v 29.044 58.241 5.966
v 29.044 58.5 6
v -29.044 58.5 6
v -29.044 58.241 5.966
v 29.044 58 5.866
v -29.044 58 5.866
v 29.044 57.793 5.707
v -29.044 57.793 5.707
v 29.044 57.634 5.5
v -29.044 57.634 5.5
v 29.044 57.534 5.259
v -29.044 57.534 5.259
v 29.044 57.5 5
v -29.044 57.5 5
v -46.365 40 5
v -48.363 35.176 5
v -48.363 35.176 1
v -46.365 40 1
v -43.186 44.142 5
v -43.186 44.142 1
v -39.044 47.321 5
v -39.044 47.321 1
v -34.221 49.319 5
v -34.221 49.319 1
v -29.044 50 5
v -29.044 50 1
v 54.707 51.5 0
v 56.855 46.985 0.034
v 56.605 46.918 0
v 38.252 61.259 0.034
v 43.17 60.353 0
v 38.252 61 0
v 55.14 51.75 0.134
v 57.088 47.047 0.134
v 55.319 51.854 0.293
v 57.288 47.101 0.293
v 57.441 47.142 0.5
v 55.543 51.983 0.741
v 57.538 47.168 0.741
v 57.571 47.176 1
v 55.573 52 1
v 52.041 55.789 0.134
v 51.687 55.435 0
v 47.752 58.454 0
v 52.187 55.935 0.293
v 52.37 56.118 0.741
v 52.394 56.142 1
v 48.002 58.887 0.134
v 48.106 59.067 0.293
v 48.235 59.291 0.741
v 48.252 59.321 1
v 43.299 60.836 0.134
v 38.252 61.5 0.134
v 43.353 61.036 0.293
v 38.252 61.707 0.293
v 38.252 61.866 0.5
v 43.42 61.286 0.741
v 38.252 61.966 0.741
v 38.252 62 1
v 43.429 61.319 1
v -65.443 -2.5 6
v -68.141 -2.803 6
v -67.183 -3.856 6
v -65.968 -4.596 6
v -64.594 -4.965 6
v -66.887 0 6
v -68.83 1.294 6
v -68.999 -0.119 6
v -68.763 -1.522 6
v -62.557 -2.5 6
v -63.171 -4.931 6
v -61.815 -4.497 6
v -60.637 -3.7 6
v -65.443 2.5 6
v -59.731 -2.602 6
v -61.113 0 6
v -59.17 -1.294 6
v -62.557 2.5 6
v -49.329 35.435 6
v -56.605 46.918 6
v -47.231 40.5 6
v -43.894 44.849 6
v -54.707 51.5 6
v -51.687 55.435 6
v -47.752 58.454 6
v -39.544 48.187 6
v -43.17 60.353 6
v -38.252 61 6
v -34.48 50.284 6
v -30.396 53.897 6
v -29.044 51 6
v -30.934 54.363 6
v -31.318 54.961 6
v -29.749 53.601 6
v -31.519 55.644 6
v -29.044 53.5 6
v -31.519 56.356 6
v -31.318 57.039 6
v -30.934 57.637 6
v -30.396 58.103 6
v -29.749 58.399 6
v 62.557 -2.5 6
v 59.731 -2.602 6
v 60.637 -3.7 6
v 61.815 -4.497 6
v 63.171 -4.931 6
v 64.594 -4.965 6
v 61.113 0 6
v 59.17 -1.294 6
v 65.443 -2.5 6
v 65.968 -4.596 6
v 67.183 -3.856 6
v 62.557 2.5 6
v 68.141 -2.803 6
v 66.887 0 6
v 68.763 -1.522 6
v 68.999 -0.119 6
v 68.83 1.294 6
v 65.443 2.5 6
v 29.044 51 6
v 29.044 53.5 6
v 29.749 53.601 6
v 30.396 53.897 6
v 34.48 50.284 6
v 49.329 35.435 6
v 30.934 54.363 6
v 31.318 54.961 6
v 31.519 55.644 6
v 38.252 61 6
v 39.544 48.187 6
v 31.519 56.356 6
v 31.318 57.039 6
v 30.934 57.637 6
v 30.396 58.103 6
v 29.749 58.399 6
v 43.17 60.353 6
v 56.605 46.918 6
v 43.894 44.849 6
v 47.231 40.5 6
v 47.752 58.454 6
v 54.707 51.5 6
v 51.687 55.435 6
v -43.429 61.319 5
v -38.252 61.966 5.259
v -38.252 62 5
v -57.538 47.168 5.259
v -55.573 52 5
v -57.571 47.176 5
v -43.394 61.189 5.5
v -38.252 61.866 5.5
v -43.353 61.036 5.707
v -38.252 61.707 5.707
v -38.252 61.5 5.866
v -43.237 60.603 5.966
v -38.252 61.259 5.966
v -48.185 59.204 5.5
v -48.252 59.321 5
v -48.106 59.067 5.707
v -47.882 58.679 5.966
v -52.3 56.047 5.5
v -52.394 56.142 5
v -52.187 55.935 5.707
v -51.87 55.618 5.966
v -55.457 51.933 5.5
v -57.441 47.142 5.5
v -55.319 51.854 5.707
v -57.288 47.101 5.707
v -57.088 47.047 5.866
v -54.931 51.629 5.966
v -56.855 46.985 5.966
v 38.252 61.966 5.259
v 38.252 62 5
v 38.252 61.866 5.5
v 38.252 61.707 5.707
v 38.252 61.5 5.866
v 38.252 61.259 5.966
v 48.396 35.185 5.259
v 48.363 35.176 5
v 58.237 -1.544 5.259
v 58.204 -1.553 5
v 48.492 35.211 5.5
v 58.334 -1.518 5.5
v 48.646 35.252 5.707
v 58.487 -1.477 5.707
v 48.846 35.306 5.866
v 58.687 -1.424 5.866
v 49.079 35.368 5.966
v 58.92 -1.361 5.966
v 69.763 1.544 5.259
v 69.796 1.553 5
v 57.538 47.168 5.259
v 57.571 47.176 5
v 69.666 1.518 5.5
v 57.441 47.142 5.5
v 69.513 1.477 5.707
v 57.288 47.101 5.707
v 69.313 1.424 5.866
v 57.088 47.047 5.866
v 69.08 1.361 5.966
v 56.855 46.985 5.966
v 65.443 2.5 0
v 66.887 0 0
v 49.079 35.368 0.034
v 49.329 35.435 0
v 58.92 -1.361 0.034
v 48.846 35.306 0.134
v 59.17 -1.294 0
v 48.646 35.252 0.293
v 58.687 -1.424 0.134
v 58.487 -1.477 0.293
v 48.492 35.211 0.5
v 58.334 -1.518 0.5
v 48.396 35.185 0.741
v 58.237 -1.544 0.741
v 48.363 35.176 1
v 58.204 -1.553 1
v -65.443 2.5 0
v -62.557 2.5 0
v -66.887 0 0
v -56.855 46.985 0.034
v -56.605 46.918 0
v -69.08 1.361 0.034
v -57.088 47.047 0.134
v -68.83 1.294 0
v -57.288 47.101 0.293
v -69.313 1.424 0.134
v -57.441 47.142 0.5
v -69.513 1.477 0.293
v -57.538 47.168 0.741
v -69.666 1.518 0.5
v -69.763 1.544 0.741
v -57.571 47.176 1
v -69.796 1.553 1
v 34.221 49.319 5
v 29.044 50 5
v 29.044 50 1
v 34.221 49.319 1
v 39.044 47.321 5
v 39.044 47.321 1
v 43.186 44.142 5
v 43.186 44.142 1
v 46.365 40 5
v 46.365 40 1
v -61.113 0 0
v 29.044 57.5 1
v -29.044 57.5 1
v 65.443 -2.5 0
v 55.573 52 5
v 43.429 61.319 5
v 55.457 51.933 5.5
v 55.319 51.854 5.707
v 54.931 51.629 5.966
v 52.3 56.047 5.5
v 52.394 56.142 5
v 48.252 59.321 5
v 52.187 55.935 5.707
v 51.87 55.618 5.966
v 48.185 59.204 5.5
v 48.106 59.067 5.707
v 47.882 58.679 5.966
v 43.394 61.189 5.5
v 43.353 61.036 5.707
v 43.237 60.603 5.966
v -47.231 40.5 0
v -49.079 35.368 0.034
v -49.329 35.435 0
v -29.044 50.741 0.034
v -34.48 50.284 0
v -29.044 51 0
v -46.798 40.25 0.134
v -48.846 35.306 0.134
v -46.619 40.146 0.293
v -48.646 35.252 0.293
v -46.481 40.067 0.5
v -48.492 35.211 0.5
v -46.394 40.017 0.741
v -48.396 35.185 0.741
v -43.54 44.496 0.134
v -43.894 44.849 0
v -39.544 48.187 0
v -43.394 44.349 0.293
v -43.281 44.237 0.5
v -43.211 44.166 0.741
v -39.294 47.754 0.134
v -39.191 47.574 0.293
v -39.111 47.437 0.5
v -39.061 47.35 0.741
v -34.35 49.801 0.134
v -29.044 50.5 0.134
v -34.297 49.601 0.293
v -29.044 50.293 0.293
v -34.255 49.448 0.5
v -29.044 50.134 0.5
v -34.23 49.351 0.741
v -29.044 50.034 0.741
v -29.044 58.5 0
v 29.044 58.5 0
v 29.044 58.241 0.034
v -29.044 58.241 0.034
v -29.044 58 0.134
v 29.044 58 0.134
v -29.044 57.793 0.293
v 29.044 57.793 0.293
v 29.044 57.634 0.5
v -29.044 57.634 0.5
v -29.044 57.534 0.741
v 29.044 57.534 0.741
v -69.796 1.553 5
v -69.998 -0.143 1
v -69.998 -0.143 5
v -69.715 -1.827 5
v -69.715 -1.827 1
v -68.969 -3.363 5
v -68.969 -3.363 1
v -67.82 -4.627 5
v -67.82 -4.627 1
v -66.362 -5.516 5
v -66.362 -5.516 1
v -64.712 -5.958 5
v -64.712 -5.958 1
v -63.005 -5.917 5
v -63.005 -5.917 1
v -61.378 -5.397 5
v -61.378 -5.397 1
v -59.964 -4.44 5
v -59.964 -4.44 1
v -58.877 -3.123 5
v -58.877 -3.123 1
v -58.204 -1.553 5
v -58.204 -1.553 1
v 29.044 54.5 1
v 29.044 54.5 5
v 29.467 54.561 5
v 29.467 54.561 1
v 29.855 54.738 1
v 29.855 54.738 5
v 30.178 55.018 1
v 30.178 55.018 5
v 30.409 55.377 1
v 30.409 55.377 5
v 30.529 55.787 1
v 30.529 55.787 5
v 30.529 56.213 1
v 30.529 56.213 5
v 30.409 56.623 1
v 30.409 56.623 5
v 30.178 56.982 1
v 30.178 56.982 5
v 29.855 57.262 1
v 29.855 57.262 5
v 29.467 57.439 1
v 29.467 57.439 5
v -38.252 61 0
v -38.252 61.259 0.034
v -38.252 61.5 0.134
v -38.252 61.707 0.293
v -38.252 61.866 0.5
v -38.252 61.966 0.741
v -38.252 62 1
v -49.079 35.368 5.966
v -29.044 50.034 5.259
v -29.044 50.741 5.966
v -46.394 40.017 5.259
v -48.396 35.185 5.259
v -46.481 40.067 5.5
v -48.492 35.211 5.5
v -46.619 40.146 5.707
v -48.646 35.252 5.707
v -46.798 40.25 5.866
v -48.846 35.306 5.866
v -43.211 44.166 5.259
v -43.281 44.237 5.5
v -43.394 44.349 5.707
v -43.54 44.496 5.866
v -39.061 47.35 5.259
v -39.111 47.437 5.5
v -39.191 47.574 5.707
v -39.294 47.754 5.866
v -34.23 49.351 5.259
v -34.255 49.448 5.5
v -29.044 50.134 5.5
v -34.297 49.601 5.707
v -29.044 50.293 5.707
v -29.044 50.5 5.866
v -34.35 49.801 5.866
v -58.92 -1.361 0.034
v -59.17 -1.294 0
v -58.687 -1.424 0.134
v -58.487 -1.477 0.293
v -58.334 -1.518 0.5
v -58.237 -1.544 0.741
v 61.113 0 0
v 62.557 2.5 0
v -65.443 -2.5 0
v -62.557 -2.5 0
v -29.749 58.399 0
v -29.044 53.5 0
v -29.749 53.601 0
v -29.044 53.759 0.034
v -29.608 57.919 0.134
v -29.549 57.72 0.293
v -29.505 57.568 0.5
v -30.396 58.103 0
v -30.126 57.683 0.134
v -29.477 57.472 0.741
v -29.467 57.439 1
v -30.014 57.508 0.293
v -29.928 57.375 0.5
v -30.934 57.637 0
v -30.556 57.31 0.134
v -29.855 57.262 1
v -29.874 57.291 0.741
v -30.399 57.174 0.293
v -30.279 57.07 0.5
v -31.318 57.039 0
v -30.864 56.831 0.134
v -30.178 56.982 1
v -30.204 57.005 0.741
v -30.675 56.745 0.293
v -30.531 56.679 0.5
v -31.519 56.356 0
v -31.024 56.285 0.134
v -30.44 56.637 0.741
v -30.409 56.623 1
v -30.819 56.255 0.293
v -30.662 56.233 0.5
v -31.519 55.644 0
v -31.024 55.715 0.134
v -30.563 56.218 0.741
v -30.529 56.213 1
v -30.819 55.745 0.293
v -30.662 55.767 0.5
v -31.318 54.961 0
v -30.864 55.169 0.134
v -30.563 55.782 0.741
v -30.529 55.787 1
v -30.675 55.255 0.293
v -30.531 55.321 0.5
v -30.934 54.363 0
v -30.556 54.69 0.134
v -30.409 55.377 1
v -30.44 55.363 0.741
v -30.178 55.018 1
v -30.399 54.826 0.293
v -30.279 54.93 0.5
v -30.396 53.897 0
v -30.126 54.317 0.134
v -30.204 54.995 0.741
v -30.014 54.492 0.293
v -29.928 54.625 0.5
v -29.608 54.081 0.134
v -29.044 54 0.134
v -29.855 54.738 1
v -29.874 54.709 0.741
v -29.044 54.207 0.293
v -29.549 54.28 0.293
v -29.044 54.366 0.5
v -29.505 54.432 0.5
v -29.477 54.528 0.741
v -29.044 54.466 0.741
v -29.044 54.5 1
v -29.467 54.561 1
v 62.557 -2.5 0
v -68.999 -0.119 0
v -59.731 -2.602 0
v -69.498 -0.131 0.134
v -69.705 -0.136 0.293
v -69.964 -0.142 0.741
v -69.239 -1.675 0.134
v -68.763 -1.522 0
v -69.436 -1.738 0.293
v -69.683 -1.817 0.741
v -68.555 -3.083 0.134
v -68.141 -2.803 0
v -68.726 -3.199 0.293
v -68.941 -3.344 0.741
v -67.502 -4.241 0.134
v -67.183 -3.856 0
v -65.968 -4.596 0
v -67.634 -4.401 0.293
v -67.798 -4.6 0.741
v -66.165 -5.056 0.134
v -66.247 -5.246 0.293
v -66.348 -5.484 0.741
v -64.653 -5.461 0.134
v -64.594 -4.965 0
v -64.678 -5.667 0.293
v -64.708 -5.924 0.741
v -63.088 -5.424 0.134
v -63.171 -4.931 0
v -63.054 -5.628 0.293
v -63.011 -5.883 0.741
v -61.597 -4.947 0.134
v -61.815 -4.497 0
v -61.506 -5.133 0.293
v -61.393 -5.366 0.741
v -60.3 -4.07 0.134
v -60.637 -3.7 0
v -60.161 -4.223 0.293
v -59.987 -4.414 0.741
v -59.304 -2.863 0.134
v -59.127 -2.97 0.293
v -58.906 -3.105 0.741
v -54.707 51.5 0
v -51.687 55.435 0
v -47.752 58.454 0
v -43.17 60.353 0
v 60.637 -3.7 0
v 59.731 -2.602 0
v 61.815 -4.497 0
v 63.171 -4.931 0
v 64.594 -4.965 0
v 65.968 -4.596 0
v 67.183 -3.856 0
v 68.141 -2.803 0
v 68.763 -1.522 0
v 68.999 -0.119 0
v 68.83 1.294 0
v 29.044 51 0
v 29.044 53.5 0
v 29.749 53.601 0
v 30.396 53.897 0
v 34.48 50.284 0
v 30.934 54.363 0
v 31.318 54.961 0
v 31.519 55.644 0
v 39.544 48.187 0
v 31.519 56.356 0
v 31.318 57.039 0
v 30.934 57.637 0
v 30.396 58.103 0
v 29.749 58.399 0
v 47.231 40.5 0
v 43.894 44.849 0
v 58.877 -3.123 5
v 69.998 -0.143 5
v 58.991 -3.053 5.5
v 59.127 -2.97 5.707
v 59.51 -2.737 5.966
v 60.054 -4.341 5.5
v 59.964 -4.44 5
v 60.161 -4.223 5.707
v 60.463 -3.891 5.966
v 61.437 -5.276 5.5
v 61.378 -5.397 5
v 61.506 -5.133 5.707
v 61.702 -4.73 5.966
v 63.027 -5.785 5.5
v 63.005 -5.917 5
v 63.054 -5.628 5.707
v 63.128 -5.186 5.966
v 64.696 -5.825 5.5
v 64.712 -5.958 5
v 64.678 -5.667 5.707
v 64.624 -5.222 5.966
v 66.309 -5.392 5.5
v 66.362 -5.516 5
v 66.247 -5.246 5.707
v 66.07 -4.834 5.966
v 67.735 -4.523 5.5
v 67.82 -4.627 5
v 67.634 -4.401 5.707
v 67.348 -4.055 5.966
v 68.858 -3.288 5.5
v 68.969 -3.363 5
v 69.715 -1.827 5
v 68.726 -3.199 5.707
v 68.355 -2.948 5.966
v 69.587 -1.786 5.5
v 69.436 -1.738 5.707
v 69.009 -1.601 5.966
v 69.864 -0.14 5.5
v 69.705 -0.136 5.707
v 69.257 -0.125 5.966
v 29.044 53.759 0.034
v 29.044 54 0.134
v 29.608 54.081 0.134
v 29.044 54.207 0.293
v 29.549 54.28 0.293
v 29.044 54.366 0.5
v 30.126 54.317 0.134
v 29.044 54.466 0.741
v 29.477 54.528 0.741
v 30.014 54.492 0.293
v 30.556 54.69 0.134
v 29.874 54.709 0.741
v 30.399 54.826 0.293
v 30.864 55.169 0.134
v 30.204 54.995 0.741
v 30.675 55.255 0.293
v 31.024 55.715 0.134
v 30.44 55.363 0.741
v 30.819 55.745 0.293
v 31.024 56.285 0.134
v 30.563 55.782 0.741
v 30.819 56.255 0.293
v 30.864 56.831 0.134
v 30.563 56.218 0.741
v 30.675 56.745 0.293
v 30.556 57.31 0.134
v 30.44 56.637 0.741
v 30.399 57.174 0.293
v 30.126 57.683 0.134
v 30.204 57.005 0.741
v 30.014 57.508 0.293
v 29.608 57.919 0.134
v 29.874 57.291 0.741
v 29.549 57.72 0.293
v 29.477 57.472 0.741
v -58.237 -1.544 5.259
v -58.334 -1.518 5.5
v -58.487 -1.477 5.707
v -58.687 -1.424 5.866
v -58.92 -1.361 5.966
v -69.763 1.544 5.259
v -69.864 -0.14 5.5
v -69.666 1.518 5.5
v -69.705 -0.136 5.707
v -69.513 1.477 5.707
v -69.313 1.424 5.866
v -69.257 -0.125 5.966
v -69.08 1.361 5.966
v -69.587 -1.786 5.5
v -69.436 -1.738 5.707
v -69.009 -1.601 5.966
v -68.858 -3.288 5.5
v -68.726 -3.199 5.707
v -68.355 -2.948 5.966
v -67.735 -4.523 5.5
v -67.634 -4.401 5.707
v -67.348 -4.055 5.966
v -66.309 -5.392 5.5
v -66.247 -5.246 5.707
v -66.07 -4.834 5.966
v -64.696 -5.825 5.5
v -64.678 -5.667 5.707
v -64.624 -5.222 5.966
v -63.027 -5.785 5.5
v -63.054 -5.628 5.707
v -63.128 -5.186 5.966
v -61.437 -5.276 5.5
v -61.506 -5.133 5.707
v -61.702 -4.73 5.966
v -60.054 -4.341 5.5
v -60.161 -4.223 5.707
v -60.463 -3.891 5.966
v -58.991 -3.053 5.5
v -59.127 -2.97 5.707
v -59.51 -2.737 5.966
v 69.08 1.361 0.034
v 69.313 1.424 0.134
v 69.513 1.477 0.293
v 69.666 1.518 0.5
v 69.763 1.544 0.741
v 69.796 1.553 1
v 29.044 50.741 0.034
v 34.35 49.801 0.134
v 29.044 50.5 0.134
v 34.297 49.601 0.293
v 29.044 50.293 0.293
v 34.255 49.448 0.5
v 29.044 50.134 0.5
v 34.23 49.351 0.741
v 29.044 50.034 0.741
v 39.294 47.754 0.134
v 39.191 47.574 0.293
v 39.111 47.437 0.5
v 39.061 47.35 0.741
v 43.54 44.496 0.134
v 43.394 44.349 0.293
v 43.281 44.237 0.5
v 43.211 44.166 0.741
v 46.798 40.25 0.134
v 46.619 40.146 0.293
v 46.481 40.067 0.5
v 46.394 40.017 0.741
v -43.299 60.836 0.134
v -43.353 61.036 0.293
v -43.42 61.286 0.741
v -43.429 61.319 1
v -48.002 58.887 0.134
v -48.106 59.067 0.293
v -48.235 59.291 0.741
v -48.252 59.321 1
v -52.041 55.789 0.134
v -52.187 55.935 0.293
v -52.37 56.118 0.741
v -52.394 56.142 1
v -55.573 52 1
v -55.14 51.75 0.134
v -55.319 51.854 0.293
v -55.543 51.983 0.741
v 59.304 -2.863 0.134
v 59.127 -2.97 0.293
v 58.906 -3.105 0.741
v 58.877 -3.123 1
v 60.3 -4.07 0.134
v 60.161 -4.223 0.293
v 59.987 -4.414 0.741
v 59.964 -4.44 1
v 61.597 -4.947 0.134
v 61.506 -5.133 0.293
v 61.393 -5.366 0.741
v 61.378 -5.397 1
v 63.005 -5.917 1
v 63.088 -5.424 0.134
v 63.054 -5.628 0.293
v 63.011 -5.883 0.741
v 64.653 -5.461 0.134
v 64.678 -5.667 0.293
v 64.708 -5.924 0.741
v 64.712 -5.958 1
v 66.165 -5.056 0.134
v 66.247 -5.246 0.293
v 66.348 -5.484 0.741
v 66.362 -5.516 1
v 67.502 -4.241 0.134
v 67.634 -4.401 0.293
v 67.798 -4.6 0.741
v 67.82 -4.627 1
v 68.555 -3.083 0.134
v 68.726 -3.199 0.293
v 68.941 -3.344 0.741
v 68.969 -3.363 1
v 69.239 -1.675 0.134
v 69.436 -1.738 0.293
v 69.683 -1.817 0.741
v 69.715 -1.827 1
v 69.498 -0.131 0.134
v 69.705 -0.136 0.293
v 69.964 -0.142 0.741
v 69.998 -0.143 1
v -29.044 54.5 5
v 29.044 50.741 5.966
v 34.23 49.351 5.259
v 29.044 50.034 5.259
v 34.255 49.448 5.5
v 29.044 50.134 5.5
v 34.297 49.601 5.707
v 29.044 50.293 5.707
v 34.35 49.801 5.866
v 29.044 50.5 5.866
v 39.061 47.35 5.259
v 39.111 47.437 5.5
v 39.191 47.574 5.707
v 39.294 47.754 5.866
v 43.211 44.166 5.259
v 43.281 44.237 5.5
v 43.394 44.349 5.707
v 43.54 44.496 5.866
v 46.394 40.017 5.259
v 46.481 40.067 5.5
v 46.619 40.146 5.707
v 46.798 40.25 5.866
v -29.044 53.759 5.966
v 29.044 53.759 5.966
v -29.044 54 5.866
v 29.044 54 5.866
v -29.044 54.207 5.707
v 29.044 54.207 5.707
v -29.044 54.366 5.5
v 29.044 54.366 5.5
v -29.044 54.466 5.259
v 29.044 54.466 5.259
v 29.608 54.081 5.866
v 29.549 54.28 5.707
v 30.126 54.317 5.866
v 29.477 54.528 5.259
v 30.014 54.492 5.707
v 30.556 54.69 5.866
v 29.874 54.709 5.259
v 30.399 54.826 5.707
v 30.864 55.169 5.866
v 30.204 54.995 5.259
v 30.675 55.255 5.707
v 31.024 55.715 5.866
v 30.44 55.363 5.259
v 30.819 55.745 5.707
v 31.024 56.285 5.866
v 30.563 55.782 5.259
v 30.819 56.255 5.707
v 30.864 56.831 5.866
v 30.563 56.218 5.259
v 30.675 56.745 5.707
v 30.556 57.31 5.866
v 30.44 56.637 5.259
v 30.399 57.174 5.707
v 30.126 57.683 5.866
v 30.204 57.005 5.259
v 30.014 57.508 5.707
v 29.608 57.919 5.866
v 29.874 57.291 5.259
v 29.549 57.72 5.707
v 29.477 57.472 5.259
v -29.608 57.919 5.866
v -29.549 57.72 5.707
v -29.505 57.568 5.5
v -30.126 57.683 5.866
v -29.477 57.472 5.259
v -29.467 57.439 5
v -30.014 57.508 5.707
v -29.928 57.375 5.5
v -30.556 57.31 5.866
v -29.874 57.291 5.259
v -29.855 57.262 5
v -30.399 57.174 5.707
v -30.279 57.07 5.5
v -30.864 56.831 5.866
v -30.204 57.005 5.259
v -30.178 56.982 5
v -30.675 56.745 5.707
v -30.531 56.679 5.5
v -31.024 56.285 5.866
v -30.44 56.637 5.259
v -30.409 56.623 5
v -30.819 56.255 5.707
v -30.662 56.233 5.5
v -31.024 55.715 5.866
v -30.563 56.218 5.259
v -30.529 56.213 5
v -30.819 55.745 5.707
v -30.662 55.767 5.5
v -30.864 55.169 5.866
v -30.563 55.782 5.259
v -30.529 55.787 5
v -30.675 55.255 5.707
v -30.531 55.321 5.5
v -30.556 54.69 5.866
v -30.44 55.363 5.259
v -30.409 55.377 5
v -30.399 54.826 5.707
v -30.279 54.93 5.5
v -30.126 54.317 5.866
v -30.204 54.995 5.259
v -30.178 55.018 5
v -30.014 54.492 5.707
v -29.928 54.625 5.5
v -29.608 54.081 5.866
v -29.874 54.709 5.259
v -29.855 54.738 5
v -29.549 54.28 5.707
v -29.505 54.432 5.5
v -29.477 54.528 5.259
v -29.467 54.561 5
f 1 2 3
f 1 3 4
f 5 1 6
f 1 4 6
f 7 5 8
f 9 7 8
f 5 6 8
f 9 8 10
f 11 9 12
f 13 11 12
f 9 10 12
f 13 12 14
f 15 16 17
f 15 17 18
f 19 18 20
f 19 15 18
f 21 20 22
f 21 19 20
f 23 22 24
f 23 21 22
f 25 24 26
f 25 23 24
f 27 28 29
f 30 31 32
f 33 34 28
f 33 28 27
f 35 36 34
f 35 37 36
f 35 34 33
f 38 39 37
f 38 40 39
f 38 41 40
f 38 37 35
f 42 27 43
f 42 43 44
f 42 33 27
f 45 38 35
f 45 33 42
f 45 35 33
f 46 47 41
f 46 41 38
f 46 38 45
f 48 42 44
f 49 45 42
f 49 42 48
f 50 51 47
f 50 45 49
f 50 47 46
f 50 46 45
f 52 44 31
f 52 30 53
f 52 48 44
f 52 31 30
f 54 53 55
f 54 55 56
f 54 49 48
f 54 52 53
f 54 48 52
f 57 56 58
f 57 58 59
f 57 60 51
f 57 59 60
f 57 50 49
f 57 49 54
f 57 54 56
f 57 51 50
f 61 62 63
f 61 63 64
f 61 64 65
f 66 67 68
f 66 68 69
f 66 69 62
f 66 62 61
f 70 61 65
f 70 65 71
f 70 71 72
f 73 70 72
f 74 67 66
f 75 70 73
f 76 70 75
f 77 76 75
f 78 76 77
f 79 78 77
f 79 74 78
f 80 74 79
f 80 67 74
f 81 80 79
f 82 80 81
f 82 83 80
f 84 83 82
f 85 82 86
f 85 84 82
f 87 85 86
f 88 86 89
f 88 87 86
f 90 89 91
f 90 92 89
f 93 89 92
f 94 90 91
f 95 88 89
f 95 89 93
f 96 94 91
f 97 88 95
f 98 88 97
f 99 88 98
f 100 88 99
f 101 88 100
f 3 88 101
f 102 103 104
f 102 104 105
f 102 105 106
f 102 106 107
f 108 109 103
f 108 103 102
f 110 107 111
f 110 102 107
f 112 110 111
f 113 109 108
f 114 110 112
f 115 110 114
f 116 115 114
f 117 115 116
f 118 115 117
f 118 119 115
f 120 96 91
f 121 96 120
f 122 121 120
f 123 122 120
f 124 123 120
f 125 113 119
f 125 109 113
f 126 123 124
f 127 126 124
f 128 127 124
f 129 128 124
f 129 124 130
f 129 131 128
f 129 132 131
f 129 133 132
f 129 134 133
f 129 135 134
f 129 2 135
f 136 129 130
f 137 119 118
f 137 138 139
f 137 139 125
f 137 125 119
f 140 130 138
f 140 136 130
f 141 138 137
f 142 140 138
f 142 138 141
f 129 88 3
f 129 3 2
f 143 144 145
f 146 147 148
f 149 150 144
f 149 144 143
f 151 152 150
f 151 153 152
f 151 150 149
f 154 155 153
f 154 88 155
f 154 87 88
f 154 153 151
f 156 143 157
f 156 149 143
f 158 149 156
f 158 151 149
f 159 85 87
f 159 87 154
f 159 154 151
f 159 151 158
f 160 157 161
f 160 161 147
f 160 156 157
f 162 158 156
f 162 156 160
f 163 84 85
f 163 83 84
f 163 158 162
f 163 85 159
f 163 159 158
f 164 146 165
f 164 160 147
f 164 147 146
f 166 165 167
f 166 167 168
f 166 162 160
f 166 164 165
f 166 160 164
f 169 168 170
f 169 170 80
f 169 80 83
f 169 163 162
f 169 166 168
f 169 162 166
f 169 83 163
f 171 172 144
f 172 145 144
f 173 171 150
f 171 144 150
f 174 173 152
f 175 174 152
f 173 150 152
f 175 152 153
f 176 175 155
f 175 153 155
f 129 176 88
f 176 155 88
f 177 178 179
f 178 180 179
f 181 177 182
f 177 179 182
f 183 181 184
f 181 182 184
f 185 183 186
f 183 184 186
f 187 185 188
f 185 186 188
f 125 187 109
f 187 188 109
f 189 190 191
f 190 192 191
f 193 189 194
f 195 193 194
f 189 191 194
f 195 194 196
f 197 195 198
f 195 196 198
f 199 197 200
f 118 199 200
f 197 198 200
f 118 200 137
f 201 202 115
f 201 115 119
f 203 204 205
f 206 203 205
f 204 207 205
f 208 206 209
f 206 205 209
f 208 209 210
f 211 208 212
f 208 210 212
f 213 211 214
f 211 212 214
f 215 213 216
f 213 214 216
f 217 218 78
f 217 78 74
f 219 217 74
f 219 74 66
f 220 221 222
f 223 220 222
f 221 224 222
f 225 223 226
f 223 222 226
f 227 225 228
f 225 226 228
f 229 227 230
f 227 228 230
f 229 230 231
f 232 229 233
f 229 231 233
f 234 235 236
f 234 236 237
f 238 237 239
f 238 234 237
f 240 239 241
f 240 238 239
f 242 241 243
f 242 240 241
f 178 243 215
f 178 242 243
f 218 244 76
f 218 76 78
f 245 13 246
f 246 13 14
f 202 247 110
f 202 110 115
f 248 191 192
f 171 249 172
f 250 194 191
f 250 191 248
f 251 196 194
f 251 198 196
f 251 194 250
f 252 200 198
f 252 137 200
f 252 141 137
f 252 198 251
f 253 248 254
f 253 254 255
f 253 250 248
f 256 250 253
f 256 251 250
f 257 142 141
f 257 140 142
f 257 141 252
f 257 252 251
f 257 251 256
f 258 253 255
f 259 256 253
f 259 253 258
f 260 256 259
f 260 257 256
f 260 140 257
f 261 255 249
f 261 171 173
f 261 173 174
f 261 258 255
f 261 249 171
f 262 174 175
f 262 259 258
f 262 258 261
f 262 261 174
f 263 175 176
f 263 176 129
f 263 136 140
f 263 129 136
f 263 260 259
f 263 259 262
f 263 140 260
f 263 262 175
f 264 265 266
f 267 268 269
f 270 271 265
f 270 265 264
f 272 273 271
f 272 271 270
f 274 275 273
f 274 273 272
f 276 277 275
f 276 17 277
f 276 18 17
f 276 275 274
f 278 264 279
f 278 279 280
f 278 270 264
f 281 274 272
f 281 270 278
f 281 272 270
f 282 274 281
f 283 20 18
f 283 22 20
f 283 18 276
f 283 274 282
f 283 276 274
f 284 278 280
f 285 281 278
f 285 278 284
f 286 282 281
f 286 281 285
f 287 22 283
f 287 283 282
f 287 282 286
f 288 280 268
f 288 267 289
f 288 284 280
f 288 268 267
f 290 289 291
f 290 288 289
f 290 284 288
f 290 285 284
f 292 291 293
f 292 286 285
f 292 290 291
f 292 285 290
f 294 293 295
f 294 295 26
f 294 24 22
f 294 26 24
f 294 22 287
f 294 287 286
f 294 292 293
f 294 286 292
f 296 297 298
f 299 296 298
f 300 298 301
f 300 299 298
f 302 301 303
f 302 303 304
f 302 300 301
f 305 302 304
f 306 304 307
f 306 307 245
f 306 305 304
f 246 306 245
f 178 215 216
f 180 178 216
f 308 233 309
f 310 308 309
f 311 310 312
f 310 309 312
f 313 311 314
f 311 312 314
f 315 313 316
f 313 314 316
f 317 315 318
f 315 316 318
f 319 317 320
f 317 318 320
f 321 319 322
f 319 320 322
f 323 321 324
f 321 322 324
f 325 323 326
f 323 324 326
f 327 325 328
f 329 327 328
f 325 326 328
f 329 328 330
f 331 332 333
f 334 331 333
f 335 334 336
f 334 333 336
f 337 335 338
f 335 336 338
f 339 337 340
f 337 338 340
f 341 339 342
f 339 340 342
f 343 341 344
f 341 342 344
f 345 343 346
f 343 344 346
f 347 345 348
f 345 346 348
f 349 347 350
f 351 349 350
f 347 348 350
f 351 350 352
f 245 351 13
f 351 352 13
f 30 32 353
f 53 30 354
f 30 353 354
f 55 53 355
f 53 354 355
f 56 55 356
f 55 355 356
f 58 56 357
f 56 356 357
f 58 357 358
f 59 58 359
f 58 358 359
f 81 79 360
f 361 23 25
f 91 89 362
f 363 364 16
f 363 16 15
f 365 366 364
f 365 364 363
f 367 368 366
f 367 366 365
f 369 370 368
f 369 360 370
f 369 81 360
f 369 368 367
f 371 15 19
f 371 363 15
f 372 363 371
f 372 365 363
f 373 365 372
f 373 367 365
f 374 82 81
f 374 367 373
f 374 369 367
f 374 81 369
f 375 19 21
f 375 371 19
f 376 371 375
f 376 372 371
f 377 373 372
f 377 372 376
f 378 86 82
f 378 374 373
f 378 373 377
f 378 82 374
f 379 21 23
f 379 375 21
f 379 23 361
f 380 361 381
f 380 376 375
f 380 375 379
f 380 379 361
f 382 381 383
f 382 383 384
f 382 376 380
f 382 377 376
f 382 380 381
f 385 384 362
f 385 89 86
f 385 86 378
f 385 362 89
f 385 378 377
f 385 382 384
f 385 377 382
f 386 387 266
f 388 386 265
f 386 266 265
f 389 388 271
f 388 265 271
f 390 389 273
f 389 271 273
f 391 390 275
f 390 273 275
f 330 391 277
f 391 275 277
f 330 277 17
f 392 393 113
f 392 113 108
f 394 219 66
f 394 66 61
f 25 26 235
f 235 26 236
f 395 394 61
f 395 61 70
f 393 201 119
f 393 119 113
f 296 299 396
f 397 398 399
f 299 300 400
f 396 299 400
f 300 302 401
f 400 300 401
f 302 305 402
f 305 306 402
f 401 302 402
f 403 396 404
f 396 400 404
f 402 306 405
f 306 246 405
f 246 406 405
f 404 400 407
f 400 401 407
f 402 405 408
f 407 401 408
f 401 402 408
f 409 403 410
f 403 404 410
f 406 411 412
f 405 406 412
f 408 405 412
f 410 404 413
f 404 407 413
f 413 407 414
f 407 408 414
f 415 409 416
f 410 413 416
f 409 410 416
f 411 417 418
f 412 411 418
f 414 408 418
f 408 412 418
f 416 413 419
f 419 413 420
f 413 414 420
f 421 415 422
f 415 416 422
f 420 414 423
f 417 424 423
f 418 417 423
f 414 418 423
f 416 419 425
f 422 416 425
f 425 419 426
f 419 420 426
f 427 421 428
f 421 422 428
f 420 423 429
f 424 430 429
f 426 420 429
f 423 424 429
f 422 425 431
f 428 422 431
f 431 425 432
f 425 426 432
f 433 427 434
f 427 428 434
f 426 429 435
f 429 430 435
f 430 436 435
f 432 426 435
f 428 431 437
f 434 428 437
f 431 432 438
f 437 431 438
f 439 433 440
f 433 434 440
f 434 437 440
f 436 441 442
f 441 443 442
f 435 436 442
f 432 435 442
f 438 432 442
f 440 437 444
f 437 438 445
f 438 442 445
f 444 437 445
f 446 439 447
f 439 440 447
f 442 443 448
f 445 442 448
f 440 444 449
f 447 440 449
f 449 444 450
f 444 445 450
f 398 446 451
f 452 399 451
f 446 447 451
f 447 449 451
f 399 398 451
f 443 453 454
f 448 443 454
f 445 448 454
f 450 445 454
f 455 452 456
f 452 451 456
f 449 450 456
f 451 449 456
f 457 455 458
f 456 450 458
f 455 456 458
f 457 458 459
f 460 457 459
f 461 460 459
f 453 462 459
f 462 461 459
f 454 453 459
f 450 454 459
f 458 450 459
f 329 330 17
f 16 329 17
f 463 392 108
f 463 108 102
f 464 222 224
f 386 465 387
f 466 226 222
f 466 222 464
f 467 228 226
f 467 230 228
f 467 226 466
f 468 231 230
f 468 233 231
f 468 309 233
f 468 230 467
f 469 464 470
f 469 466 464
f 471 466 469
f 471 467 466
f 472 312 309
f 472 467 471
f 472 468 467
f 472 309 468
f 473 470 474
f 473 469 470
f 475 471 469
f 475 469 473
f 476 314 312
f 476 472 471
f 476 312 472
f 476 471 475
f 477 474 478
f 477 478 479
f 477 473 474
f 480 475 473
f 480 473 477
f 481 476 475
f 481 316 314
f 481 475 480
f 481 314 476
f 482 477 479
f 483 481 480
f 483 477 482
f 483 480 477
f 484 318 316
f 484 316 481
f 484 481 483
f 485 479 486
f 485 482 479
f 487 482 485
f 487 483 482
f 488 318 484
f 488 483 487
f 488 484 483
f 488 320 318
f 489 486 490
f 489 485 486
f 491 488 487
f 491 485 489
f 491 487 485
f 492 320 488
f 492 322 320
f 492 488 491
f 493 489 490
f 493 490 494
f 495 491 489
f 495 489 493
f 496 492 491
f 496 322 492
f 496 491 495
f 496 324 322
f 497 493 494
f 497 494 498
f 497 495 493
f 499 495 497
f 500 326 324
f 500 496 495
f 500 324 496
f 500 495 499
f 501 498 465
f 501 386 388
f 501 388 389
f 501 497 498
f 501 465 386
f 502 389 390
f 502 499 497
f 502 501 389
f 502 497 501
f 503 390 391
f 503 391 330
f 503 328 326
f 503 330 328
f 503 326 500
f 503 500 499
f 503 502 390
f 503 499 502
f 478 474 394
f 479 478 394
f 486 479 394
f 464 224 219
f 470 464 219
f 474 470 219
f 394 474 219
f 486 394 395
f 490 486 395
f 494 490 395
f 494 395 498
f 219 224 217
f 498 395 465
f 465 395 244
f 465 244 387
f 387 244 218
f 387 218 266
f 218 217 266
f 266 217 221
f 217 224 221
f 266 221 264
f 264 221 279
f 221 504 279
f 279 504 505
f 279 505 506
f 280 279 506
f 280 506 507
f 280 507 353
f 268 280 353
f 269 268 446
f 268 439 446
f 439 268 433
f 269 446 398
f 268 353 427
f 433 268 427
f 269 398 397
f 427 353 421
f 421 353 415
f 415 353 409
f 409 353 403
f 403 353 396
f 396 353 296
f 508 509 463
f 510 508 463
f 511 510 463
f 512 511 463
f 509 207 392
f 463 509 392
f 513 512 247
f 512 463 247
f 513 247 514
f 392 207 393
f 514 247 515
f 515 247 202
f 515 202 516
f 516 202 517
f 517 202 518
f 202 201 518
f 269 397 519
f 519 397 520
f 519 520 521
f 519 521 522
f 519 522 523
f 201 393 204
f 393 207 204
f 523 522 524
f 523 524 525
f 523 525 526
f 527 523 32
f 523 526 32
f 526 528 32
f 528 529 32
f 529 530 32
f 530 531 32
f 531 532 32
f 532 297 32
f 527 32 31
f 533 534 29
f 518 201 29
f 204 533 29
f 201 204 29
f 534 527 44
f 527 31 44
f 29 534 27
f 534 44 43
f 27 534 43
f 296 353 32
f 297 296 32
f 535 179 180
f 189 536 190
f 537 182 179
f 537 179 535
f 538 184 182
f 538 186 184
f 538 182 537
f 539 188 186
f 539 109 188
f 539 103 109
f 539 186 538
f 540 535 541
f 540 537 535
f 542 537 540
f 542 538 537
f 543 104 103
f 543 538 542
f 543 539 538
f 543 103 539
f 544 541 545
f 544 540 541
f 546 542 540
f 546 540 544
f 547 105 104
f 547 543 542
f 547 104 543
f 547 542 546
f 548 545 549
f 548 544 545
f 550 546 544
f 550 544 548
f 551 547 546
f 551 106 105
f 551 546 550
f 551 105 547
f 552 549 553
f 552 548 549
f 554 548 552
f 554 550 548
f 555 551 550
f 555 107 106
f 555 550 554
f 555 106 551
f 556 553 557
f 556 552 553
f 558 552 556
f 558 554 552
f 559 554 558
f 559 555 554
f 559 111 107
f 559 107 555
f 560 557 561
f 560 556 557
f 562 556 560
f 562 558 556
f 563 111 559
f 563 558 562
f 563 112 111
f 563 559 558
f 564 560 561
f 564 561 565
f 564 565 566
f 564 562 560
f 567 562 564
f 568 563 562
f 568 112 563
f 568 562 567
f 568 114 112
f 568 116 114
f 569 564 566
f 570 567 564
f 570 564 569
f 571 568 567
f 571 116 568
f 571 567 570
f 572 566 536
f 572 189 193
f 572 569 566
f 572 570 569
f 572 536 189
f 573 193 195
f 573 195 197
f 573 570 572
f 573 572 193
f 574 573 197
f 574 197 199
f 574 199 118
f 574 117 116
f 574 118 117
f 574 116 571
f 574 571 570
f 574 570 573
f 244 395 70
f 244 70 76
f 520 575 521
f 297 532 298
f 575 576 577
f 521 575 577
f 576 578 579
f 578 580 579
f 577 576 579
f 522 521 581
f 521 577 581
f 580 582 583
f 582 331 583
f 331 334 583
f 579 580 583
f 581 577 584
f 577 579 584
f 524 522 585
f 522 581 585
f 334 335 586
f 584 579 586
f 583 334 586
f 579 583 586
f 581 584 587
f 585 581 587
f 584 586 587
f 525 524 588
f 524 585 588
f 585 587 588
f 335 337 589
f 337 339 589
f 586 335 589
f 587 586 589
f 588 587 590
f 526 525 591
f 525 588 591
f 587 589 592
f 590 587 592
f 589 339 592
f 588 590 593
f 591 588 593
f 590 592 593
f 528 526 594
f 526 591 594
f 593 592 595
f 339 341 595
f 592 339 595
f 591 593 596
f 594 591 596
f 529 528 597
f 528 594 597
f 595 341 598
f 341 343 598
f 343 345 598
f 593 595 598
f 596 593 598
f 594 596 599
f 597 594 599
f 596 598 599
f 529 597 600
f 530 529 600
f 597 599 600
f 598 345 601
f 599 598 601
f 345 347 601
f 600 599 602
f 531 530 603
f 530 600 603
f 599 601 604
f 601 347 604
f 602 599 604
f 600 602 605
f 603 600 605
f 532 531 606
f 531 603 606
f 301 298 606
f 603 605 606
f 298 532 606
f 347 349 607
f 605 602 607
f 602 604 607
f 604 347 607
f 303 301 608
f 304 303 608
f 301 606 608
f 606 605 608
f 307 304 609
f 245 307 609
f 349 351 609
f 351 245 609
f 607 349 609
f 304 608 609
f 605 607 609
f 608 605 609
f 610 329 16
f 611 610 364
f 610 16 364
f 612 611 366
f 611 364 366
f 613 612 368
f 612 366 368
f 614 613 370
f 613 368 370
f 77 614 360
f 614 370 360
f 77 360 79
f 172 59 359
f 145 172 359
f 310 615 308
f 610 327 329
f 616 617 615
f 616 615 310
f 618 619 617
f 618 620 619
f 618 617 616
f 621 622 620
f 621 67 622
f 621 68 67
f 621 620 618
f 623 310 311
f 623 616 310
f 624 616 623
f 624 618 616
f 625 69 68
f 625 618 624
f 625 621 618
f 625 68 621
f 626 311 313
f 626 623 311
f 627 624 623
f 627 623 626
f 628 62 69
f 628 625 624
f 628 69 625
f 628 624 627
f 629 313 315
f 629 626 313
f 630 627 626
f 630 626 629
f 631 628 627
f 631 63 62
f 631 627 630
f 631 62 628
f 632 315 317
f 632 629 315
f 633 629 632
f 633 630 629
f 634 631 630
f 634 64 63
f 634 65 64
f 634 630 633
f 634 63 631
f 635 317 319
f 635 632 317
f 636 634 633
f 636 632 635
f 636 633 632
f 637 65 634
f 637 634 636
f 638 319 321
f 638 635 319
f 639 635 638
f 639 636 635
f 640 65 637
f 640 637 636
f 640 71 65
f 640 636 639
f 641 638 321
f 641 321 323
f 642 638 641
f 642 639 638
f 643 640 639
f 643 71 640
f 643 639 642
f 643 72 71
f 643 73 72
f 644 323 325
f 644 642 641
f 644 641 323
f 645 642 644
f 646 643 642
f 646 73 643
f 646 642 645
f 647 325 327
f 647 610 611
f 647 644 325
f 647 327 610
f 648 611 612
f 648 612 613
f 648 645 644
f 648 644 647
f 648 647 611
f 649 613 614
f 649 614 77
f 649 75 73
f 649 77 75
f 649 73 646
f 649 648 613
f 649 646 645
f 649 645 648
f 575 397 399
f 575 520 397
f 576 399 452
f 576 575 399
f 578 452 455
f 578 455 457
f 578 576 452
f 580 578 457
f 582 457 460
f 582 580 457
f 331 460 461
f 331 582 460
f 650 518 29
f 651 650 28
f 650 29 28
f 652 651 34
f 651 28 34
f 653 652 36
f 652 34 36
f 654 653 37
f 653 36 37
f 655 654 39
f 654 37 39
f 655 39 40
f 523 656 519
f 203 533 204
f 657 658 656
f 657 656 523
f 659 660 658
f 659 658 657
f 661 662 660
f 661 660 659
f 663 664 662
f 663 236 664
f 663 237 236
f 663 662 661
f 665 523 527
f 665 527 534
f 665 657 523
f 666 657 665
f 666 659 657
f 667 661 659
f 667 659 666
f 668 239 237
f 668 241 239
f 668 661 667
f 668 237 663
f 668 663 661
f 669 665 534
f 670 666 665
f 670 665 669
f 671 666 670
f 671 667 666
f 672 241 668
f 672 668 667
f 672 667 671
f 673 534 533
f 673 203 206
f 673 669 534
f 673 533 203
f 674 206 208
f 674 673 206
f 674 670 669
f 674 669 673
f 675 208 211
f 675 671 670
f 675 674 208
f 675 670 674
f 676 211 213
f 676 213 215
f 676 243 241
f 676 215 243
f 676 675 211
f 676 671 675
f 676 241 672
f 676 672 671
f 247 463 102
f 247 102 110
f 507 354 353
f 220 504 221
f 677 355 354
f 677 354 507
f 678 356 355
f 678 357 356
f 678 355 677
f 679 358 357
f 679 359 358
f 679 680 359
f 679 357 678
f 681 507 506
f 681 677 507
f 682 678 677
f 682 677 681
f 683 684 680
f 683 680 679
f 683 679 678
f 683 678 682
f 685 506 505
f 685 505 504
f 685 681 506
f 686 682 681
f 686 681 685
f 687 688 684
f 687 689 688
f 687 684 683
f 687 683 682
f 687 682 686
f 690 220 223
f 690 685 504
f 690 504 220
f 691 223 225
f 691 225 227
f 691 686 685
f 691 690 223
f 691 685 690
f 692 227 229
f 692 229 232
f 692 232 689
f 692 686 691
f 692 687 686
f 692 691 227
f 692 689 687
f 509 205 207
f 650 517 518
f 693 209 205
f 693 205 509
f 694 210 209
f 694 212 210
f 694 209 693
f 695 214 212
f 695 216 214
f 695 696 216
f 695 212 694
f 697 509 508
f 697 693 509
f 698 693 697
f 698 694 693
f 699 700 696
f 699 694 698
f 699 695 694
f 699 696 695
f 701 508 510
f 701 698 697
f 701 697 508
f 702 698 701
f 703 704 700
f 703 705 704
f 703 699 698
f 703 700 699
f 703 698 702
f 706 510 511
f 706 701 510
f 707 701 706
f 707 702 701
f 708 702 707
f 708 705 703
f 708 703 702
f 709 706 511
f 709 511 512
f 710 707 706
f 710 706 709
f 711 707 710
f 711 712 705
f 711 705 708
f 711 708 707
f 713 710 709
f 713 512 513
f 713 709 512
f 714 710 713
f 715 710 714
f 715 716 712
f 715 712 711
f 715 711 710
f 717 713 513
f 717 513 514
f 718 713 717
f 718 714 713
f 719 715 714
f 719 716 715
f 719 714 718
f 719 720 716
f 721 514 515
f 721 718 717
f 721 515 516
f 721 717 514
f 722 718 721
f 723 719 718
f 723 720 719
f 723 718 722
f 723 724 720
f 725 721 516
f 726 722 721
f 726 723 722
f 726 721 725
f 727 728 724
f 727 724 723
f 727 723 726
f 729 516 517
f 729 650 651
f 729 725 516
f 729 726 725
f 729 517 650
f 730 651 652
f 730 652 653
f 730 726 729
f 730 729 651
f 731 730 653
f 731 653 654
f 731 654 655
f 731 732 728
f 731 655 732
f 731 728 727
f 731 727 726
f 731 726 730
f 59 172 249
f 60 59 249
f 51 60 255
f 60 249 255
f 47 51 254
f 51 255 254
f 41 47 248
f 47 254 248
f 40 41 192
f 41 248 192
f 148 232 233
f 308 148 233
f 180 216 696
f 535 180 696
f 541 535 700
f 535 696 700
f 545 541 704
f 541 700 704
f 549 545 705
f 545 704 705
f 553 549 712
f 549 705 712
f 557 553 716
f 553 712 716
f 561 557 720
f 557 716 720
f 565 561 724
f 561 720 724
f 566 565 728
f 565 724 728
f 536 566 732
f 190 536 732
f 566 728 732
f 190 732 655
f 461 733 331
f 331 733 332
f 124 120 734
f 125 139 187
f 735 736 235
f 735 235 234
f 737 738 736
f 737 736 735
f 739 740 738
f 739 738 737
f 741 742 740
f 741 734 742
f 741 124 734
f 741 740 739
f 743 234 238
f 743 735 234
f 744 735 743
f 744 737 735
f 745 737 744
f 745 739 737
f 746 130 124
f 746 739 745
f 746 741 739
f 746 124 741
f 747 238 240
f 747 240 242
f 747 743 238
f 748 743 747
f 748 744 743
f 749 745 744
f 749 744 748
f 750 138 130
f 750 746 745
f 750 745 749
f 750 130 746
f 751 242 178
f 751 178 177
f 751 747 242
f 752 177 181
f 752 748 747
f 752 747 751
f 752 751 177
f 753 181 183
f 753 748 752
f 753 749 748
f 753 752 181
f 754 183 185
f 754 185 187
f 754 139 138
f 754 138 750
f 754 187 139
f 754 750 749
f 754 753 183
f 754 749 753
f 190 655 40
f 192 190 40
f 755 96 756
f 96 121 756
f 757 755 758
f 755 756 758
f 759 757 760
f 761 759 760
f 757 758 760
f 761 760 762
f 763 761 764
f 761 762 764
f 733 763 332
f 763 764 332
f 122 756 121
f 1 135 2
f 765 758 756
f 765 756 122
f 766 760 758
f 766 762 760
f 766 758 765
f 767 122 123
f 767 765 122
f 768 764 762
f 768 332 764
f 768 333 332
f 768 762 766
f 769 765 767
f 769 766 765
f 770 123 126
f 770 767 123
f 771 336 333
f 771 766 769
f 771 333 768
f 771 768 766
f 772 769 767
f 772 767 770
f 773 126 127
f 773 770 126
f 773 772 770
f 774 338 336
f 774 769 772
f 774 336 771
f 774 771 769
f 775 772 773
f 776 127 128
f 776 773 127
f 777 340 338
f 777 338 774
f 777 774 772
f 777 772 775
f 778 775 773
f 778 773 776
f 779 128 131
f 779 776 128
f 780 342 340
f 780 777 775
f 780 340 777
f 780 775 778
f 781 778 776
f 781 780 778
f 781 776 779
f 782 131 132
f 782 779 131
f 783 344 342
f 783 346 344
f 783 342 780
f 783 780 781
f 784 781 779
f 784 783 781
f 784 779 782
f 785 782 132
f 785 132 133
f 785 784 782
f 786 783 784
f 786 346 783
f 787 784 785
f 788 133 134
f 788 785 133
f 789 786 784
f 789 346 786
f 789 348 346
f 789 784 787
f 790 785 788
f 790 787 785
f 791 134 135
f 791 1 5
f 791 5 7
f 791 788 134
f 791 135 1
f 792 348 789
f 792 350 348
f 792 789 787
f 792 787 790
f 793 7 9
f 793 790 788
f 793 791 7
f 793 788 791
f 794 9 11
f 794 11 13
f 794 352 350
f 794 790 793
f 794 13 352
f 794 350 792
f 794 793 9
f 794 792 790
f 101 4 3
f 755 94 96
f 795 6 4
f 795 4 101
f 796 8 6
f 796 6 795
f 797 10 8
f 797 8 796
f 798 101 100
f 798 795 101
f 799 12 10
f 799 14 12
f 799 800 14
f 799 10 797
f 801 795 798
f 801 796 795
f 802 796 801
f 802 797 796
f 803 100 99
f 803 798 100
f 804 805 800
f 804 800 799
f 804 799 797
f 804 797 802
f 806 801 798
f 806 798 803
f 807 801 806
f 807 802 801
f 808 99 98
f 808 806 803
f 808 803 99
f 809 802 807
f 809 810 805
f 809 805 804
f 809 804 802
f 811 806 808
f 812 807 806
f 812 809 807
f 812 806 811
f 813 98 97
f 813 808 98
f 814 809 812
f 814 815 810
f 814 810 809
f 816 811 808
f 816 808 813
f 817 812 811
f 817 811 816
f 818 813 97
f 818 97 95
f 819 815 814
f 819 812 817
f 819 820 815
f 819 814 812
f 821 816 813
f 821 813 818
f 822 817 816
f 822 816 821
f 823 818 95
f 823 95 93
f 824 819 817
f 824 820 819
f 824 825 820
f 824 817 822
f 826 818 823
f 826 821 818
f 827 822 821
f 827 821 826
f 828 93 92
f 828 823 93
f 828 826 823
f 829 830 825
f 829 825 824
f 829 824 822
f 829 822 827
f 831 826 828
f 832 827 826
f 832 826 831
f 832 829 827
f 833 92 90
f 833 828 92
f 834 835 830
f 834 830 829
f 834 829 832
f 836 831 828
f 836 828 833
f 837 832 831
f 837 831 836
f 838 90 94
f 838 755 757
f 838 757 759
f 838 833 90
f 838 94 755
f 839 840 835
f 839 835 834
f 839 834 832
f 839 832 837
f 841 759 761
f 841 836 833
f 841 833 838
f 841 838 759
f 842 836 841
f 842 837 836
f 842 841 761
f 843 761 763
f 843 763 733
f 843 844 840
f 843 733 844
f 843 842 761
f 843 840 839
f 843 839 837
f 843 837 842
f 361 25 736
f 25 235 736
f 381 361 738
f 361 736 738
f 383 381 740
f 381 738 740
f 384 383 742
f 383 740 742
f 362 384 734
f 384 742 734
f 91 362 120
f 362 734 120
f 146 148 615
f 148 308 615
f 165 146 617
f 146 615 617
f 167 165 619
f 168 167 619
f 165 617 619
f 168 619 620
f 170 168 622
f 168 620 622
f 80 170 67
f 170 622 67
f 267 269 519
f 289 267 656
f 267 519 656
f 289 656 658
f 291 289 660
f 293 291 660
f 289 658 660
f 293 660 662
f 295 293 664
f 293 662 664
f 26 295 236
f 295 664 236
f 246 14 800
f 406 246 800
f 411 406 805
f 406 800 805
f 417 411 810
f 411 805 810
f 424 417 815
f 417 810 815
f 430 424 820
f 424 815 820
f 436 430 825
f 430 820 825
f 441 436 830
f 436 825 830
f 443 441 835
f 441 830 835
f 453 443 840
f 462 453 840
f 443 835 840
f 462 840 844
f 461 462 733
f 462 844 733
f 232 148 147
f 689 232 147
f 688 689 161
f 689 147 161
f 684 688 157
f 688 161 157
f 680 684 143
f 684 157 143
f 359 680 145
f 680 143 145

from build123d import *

# Parameters (mm, degrees)
PAD_DEPTH    = 6
FILLET_R     = 20
POCKET_DEPTH = 6
FILLET001_R  = 1
FILLET002_R  = 1


with BuildPart() as part:
    # Sketch → Pad (new body)
    with BuildSketch(Plane.XY):
        with BuildLine():
            ThreePointArc((-69.795555, 1.552914), (-65.552914, -5.795555), (-58.204445, -1.552914))
            Line((-58.204445, -1.552914), (-44.390883, 50))
            Line((-44.390883, 50), (44.390883, 50))
            Line((44.390883, 50), (58.204445, -1.552914))
            ThreePointArc((58.204445, -1.552914), (65.552914, -5.795555), (69.795555, 1.552914))
            Line((69.795555, 1.552914), (53.598807, 62))
            Line((53.598807, 62), (-53.598807, 62))
            Line((-53.598807, 62), (-69.795555, 1.552914))
        make_face()
        Polygon((-62.556624, 2.5), (-65.443376, 2.5), (-66.886751, 0), (-65.443376, -2.5), (-62.556624, -2.5), (-61.113249, 0), align=None, mode=Mode.SUBTRACT)
        Polygon((65.443376, 2.5), (62.556624, 2.5), (61.113249, 0), (62.556624, -2.5), (65.443376, -2.5), (66.886751, 0), align=None, mode=Mode.SUBTRACT)
    extrude(amount=PAD_DEPTH)

    # Fillet
    fillet_edges = [part.edges().sort_by_distance(p)[0] for p in [
        (-53.598807, 62, 3),
        (53.598807, 62, 3),
        (-44.390883, 50, 3),
        (44.390883, 50, 3),
    ]]
    fillet(fillet_edges, radius=FILLET_R)

    # Sketch001 (on Face5 of Fillet) → Pocket (cut)
    with BuildSketch(Plane.XY.offset(6)):
        with BuildLine():
            ThreePointArc((-29.044344, 57.5), (-30.544344, 56), (-29.044344, 54.5))
            Line((-29.044344, 54.5), (29.044344, 54.5))
            ThreePointArc((29.044344, 54.5), (30.544344, 56), (29.044344, 57.5))
            Line((29.044344, 57.5), (-29.044344, 57.5))
        make_face()
    extrude(amount=-POCKET_DEPTH, mode=Mode.SUBTRACT)

    # Fillet001
    fillet001_edges = [part.edges().sort_by_distance(p)[0] for p in [
        (0, 57.5, 6),
        (0, 57.5, 0),
    ]]
    fillet(fillet001_edges, radius=FILLET001_R)

    # Fillet002
    fillet002_edges = [part.edges().sort_by_distance(p)[0] for p in [
        (-41.219572, 45.867067, 6),
        (41.219572, 45.867067, 0),
    ]]
    fillet(fillet002_edges, radius=FILLET002_R)


solid = part.part
